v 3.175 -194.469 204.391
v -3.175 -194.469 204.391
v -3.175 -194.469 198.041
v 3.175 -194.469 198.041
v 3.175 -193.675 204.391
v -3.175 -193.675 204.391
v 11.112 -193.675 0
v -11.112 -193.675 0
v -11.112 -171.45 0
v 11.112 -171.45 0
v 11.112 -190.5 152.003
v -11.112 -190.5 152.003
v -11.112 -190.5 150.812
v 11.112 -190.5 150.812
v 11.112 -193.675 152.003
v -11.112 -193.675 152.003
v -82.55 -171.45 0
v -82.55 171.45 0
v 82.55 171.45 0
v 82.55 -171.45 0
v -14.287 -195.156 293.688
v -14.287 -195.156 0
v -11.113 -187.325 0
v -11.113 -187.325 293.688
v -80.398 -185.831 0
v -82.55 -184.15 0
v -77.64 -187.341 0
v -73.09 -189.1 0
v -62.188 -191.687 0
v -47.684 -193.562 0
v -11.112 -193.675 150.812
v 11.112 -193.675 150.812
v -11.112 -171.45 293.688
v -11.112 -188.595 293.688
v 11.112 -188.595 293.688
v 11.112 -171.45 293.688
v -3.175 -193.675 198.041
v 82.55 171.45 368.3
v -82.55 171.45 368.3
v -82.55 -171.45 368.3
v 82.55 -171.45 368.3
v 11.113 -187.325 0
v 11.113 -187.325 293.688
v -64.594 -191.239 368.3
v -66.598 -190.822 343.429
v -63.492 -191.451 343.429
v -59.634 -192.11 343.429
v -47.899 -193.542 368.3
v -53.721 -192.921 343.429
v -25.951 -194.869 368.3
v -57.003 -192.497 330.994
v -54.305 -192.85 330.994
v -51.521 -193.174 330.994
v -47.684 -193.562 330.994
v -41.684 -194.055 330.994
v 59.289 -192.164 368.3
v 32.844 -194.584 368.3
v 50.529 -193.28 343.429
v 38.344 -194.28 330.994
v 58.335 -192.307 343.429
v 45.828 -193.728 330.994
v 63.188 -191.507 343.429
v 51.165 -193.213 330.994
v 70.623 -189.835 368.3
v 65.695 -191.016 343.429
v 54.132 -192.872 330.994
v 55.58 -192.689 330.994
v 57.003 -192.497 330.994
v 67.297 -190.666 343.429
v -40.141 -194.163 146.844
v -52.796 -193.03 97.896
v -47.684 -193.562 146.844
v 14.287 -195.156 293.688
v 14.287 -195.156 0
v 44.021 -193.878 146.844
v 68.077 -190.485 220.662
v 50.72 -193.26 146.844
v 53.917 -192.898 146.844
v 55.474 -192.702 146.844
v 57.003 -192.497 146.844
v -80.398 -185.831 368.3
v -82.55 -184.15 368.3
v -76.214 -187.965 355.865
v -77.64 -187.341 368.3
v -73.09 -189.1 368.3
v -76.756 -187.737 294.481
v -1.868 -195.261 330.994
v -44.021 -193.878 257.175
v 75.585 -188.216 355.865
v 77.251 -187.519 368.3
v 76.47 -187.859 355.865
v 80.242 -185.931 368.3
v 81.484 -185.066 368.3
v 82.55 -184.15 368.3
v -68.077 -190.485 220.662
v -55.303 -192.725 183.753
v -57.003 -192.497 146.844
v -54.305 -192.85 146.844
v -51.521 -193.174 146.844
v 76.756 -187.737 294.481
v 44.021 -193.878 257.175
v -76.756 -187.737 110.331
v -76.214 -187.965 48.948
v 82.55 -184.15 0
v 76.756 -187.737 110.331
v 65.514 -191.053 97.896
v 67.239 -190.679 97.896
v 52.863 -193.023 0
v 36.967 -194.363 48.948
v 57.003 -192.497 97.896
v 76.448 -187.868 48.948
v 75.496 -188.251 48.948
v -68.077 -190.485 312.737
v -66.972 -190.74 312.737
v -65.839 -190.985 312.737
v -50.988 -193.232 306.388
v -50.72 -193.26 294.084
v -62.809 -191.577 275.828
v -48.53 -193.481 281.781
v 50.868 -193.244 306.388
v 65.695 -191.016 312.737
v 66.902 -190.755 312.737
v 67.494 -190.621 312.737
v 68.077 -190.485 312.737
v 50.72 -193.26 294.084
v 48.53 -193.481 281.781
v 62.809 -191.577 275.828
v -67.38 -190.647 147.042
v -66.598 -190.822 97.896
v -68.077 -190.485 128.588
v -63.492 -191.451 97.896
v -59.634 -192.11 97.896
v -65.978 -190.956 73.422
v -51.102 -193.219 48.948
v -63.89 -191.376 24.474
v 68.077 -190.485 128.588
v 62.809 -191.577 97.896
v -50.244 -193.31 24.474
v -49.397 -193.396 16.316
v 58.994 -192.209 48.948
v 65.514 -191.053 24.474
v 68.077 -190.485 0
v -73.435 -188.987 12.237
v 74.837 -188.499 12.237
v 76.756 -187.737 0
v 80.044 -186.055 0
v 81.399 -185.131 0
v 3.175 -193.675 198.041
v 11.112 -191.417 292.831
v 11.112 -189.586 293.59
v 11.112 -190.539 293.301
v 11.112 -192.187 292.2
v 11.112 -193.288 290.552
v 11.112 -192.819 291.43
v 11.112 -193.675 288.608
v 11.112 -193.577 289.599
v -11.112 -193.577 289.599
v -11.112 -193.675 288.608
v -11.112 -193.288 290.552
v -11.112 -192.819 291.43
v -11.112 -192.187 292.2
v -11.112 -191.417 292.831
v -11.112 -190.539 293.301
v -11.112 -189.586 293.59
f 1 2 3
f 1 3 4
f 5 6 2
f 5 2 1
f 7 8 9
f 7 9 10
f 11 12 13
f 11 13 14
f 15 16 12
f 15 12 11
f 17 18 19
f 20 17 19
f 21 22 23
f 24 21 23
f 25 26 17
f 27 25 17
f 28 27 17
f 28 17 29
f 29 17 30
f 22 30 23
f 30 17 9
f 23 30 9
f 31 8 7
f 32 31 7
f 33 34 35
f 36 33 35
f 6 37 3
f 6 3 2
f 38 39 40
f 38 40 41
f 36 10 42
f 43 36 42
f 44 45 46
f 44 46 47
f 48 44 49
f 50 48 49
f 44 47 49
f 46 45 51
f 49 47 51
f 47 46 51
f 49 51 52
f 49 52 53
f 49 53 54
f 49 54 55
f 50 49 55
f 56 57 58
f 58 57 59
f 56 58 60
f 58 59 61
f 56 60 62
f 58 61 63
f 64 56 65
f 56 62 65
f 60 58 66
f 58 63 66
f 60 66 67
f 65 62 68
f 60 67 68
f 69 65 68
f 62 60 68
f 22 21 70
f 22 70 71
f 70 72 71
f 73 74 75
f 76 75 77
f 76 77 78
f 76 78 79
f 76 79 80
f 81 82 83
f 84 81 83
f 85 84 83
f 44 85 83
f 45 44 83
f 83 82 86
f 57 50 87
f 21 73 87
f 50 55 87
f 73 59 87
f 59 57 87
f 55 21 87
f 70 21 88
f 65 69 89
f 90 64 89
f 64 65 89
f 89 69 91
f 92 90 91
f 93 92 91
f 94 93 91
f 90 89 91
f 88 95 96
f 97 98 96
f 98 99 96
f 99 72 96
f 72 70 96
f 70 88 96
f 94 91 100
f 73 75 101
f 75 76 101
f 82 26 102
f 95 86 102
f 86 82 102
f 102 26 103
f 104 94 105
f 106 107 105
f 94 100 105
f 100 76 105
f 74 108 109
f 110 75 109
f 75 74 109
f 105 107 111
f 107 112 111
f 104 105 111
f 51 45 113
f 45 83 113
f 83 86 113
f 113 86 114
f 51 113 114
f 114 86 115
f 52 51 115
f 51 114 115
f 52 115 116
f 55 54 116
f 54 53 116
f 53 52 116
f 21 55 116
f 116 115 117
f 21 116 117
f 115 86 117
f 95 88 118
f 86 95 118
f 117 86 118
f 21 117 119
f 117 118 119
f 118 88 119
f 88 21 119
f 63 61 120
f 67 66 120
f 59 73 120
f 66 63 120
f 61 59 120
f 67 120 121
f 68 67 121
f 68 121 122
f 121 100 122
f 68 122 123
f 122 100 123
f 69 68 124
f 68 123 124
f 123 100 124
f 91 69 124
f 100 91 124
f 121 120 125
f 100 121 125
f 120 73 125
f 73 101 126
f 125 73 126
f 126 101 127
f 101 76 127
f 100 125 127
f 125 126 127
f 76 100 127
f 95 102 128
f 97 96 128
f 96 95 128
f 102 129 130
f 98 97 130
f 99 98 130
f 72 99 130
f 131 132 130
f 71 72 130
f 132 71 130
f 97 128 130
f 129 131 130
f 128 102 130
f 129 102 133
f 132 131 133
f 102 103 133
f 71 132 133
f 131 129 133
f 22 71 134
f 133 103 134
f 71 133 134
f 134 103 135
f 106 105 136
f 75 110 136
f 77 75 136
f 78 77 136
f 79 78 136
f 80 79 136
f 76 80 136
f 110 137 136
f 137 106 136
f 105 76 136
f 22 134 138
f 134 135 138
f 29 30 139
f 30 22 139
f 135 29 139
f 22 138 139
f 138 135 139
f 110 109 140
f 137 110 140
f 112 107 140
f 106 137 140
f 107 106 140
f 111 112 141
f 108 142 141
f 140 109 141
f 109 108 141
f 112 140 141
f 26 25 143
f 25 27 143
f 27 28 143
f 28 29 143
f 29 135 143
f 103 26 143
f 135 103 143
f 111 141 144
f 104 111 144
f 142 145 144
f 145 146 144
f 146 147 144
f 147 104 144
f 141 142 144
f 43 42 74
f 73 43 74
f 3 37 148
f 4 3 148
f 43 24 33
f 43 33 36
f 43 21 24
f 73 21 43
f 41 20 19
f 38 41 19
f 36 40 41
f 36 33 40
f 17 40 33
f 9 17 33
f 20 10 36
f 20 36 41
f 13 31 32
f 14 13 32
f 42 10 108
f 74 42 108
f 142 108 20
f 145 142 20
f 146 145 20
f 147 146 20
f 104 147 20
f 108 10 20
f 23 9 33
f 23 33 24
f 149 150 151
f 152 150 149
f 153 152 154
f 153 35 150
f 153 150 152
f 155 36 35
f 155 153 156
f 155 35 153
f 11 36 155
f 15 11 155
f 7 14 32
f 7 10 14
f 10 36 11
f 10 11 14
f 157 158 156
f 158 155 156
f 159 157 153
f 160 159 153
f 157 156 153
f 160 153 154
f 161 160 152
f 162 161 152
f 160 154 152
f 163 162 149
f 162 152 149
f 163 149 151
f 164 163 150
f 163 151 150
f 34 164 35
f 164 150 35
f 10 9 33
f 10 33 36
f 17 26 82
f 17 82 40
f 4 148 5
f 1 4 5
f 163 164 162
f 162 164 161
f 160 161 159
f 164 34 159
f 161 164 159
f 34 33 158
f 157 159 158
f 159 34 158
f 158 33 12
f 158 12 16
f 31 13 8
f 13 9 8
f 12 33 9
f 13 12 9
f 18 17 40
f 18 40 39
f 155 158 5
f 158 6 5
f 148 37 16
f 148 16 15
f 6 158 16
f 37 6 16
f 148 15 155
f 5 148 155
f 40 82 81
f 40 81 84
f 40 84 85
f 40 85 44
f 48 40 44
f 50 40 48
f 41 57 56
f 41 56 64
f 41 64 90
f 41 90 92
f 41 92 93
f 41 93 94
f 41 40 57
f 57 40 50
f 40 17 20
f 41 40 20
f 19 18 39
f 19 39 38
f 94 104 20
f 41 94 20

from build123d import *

# Parameters (mm, degrees)
F0_W      = 165.1
F0_H      = 342.9
F1_DEPTH  = 368.3
F2_W      = 165.1
F2_H      = 12.7
F3_DEPTH  = 368.3
F4_W      = 22.225
F4_H      = 15.875
F5_DEPTH  = 293.6875
F6_W      = 22.225
F6_H      = 22.225
F7_DEPTH  = 293.6875
F8_R      = 5.08
F9_W      = 22.225
F9_H      = 1.190625
F10_DEPTH = 3.175
F11_W     = 6.35
F11_H     = 6.35
F12_DEPTH = 0.79375


with BuildPart() as f1:
    # F0 (on Top) → F1 (new body)
    with BuildSketch(Plane.XY):
        Rectangle(F0_W, F0_H)
    extrude(amount=F1_DEPTH)


with BuildPart() as f3:
    # F2 (on Top) → F3 (new body, through all)
    with BuildSketch(Plane.XY):
        with Locations((0, -177.8)):
            Rectangle(F2_W, F2_H)
        with BuildLine():
            Line((82.55, -184.15), (-82.55, -184.15))
            add(Edge.make_bspline(
                [(-82.55, -184.15), (-72.906107, -193.453029), (0, -197.071971), (72.906107, -193.453029), (82.55, -184.15)],
                knots=[0, 0, 0, 0, 83.294599, 166.589197, 166.589197, 166.589197, 166.589197], degree=3))
        make_face()
    extrude(amount=F3_DEPTH)

    # F4 (on face) → F5 (cut)
    with BuildSketch(Plane(origin=(0, 0, 0), x_dir=(1, 0, 0), z_dir=(0, 0, -1))):
        with Locations((0, 179.3875)):
            Rectangle(F4_W, F4_H)
        Polygon((-14.330589, 195.2625), (-11.1125, 187.325), (11.1125, 187.325), (14.330589, 195.2625), align=None)
    extrude(amount=-F5_DEPTH, mode=Mode.SUBTRACT)


with BuildPart() as f7:
    # F6 (on face) → F7 (new body, through all)
    with BuildSketch(Plane(origin=(0, 0, 0), x_dir=(1, 0, 0), z_dir=(0, 0, -1))):
        with Locations((0, 182.5625)):
            Rectangle(F6_W, F6_H)
    extrude(amount=-F7_DEPTH)

    # F8
    f8_edges = [f7.edges().sort_by_distance(p)[0] for p in [
        (0, -193.675, 293.6875),
    ]]
    fillet(f8_edges, radius=F8_R)

    # F9 (on face) → F10 (cut)
    with BuildSketch(Plane.XZ.offset(193.675)):
        with Locations((0, 151.407812)):
            Rectangle(F9_W, F9_H)
    extrude(amount=-F10_DEPTH, mode=Mode.SUBTRACT)

    # F11 (on face) → F12 (join)
    with BuildSketch(Plane.XZ.offset(193.675)):
        with Locations((0, 201.215625)):
            Rectangle(F11_W, F11_H)
    extrude(amount=F12_DEPTH)


solid = Compound([f1.part, f3.part, f7.part])
